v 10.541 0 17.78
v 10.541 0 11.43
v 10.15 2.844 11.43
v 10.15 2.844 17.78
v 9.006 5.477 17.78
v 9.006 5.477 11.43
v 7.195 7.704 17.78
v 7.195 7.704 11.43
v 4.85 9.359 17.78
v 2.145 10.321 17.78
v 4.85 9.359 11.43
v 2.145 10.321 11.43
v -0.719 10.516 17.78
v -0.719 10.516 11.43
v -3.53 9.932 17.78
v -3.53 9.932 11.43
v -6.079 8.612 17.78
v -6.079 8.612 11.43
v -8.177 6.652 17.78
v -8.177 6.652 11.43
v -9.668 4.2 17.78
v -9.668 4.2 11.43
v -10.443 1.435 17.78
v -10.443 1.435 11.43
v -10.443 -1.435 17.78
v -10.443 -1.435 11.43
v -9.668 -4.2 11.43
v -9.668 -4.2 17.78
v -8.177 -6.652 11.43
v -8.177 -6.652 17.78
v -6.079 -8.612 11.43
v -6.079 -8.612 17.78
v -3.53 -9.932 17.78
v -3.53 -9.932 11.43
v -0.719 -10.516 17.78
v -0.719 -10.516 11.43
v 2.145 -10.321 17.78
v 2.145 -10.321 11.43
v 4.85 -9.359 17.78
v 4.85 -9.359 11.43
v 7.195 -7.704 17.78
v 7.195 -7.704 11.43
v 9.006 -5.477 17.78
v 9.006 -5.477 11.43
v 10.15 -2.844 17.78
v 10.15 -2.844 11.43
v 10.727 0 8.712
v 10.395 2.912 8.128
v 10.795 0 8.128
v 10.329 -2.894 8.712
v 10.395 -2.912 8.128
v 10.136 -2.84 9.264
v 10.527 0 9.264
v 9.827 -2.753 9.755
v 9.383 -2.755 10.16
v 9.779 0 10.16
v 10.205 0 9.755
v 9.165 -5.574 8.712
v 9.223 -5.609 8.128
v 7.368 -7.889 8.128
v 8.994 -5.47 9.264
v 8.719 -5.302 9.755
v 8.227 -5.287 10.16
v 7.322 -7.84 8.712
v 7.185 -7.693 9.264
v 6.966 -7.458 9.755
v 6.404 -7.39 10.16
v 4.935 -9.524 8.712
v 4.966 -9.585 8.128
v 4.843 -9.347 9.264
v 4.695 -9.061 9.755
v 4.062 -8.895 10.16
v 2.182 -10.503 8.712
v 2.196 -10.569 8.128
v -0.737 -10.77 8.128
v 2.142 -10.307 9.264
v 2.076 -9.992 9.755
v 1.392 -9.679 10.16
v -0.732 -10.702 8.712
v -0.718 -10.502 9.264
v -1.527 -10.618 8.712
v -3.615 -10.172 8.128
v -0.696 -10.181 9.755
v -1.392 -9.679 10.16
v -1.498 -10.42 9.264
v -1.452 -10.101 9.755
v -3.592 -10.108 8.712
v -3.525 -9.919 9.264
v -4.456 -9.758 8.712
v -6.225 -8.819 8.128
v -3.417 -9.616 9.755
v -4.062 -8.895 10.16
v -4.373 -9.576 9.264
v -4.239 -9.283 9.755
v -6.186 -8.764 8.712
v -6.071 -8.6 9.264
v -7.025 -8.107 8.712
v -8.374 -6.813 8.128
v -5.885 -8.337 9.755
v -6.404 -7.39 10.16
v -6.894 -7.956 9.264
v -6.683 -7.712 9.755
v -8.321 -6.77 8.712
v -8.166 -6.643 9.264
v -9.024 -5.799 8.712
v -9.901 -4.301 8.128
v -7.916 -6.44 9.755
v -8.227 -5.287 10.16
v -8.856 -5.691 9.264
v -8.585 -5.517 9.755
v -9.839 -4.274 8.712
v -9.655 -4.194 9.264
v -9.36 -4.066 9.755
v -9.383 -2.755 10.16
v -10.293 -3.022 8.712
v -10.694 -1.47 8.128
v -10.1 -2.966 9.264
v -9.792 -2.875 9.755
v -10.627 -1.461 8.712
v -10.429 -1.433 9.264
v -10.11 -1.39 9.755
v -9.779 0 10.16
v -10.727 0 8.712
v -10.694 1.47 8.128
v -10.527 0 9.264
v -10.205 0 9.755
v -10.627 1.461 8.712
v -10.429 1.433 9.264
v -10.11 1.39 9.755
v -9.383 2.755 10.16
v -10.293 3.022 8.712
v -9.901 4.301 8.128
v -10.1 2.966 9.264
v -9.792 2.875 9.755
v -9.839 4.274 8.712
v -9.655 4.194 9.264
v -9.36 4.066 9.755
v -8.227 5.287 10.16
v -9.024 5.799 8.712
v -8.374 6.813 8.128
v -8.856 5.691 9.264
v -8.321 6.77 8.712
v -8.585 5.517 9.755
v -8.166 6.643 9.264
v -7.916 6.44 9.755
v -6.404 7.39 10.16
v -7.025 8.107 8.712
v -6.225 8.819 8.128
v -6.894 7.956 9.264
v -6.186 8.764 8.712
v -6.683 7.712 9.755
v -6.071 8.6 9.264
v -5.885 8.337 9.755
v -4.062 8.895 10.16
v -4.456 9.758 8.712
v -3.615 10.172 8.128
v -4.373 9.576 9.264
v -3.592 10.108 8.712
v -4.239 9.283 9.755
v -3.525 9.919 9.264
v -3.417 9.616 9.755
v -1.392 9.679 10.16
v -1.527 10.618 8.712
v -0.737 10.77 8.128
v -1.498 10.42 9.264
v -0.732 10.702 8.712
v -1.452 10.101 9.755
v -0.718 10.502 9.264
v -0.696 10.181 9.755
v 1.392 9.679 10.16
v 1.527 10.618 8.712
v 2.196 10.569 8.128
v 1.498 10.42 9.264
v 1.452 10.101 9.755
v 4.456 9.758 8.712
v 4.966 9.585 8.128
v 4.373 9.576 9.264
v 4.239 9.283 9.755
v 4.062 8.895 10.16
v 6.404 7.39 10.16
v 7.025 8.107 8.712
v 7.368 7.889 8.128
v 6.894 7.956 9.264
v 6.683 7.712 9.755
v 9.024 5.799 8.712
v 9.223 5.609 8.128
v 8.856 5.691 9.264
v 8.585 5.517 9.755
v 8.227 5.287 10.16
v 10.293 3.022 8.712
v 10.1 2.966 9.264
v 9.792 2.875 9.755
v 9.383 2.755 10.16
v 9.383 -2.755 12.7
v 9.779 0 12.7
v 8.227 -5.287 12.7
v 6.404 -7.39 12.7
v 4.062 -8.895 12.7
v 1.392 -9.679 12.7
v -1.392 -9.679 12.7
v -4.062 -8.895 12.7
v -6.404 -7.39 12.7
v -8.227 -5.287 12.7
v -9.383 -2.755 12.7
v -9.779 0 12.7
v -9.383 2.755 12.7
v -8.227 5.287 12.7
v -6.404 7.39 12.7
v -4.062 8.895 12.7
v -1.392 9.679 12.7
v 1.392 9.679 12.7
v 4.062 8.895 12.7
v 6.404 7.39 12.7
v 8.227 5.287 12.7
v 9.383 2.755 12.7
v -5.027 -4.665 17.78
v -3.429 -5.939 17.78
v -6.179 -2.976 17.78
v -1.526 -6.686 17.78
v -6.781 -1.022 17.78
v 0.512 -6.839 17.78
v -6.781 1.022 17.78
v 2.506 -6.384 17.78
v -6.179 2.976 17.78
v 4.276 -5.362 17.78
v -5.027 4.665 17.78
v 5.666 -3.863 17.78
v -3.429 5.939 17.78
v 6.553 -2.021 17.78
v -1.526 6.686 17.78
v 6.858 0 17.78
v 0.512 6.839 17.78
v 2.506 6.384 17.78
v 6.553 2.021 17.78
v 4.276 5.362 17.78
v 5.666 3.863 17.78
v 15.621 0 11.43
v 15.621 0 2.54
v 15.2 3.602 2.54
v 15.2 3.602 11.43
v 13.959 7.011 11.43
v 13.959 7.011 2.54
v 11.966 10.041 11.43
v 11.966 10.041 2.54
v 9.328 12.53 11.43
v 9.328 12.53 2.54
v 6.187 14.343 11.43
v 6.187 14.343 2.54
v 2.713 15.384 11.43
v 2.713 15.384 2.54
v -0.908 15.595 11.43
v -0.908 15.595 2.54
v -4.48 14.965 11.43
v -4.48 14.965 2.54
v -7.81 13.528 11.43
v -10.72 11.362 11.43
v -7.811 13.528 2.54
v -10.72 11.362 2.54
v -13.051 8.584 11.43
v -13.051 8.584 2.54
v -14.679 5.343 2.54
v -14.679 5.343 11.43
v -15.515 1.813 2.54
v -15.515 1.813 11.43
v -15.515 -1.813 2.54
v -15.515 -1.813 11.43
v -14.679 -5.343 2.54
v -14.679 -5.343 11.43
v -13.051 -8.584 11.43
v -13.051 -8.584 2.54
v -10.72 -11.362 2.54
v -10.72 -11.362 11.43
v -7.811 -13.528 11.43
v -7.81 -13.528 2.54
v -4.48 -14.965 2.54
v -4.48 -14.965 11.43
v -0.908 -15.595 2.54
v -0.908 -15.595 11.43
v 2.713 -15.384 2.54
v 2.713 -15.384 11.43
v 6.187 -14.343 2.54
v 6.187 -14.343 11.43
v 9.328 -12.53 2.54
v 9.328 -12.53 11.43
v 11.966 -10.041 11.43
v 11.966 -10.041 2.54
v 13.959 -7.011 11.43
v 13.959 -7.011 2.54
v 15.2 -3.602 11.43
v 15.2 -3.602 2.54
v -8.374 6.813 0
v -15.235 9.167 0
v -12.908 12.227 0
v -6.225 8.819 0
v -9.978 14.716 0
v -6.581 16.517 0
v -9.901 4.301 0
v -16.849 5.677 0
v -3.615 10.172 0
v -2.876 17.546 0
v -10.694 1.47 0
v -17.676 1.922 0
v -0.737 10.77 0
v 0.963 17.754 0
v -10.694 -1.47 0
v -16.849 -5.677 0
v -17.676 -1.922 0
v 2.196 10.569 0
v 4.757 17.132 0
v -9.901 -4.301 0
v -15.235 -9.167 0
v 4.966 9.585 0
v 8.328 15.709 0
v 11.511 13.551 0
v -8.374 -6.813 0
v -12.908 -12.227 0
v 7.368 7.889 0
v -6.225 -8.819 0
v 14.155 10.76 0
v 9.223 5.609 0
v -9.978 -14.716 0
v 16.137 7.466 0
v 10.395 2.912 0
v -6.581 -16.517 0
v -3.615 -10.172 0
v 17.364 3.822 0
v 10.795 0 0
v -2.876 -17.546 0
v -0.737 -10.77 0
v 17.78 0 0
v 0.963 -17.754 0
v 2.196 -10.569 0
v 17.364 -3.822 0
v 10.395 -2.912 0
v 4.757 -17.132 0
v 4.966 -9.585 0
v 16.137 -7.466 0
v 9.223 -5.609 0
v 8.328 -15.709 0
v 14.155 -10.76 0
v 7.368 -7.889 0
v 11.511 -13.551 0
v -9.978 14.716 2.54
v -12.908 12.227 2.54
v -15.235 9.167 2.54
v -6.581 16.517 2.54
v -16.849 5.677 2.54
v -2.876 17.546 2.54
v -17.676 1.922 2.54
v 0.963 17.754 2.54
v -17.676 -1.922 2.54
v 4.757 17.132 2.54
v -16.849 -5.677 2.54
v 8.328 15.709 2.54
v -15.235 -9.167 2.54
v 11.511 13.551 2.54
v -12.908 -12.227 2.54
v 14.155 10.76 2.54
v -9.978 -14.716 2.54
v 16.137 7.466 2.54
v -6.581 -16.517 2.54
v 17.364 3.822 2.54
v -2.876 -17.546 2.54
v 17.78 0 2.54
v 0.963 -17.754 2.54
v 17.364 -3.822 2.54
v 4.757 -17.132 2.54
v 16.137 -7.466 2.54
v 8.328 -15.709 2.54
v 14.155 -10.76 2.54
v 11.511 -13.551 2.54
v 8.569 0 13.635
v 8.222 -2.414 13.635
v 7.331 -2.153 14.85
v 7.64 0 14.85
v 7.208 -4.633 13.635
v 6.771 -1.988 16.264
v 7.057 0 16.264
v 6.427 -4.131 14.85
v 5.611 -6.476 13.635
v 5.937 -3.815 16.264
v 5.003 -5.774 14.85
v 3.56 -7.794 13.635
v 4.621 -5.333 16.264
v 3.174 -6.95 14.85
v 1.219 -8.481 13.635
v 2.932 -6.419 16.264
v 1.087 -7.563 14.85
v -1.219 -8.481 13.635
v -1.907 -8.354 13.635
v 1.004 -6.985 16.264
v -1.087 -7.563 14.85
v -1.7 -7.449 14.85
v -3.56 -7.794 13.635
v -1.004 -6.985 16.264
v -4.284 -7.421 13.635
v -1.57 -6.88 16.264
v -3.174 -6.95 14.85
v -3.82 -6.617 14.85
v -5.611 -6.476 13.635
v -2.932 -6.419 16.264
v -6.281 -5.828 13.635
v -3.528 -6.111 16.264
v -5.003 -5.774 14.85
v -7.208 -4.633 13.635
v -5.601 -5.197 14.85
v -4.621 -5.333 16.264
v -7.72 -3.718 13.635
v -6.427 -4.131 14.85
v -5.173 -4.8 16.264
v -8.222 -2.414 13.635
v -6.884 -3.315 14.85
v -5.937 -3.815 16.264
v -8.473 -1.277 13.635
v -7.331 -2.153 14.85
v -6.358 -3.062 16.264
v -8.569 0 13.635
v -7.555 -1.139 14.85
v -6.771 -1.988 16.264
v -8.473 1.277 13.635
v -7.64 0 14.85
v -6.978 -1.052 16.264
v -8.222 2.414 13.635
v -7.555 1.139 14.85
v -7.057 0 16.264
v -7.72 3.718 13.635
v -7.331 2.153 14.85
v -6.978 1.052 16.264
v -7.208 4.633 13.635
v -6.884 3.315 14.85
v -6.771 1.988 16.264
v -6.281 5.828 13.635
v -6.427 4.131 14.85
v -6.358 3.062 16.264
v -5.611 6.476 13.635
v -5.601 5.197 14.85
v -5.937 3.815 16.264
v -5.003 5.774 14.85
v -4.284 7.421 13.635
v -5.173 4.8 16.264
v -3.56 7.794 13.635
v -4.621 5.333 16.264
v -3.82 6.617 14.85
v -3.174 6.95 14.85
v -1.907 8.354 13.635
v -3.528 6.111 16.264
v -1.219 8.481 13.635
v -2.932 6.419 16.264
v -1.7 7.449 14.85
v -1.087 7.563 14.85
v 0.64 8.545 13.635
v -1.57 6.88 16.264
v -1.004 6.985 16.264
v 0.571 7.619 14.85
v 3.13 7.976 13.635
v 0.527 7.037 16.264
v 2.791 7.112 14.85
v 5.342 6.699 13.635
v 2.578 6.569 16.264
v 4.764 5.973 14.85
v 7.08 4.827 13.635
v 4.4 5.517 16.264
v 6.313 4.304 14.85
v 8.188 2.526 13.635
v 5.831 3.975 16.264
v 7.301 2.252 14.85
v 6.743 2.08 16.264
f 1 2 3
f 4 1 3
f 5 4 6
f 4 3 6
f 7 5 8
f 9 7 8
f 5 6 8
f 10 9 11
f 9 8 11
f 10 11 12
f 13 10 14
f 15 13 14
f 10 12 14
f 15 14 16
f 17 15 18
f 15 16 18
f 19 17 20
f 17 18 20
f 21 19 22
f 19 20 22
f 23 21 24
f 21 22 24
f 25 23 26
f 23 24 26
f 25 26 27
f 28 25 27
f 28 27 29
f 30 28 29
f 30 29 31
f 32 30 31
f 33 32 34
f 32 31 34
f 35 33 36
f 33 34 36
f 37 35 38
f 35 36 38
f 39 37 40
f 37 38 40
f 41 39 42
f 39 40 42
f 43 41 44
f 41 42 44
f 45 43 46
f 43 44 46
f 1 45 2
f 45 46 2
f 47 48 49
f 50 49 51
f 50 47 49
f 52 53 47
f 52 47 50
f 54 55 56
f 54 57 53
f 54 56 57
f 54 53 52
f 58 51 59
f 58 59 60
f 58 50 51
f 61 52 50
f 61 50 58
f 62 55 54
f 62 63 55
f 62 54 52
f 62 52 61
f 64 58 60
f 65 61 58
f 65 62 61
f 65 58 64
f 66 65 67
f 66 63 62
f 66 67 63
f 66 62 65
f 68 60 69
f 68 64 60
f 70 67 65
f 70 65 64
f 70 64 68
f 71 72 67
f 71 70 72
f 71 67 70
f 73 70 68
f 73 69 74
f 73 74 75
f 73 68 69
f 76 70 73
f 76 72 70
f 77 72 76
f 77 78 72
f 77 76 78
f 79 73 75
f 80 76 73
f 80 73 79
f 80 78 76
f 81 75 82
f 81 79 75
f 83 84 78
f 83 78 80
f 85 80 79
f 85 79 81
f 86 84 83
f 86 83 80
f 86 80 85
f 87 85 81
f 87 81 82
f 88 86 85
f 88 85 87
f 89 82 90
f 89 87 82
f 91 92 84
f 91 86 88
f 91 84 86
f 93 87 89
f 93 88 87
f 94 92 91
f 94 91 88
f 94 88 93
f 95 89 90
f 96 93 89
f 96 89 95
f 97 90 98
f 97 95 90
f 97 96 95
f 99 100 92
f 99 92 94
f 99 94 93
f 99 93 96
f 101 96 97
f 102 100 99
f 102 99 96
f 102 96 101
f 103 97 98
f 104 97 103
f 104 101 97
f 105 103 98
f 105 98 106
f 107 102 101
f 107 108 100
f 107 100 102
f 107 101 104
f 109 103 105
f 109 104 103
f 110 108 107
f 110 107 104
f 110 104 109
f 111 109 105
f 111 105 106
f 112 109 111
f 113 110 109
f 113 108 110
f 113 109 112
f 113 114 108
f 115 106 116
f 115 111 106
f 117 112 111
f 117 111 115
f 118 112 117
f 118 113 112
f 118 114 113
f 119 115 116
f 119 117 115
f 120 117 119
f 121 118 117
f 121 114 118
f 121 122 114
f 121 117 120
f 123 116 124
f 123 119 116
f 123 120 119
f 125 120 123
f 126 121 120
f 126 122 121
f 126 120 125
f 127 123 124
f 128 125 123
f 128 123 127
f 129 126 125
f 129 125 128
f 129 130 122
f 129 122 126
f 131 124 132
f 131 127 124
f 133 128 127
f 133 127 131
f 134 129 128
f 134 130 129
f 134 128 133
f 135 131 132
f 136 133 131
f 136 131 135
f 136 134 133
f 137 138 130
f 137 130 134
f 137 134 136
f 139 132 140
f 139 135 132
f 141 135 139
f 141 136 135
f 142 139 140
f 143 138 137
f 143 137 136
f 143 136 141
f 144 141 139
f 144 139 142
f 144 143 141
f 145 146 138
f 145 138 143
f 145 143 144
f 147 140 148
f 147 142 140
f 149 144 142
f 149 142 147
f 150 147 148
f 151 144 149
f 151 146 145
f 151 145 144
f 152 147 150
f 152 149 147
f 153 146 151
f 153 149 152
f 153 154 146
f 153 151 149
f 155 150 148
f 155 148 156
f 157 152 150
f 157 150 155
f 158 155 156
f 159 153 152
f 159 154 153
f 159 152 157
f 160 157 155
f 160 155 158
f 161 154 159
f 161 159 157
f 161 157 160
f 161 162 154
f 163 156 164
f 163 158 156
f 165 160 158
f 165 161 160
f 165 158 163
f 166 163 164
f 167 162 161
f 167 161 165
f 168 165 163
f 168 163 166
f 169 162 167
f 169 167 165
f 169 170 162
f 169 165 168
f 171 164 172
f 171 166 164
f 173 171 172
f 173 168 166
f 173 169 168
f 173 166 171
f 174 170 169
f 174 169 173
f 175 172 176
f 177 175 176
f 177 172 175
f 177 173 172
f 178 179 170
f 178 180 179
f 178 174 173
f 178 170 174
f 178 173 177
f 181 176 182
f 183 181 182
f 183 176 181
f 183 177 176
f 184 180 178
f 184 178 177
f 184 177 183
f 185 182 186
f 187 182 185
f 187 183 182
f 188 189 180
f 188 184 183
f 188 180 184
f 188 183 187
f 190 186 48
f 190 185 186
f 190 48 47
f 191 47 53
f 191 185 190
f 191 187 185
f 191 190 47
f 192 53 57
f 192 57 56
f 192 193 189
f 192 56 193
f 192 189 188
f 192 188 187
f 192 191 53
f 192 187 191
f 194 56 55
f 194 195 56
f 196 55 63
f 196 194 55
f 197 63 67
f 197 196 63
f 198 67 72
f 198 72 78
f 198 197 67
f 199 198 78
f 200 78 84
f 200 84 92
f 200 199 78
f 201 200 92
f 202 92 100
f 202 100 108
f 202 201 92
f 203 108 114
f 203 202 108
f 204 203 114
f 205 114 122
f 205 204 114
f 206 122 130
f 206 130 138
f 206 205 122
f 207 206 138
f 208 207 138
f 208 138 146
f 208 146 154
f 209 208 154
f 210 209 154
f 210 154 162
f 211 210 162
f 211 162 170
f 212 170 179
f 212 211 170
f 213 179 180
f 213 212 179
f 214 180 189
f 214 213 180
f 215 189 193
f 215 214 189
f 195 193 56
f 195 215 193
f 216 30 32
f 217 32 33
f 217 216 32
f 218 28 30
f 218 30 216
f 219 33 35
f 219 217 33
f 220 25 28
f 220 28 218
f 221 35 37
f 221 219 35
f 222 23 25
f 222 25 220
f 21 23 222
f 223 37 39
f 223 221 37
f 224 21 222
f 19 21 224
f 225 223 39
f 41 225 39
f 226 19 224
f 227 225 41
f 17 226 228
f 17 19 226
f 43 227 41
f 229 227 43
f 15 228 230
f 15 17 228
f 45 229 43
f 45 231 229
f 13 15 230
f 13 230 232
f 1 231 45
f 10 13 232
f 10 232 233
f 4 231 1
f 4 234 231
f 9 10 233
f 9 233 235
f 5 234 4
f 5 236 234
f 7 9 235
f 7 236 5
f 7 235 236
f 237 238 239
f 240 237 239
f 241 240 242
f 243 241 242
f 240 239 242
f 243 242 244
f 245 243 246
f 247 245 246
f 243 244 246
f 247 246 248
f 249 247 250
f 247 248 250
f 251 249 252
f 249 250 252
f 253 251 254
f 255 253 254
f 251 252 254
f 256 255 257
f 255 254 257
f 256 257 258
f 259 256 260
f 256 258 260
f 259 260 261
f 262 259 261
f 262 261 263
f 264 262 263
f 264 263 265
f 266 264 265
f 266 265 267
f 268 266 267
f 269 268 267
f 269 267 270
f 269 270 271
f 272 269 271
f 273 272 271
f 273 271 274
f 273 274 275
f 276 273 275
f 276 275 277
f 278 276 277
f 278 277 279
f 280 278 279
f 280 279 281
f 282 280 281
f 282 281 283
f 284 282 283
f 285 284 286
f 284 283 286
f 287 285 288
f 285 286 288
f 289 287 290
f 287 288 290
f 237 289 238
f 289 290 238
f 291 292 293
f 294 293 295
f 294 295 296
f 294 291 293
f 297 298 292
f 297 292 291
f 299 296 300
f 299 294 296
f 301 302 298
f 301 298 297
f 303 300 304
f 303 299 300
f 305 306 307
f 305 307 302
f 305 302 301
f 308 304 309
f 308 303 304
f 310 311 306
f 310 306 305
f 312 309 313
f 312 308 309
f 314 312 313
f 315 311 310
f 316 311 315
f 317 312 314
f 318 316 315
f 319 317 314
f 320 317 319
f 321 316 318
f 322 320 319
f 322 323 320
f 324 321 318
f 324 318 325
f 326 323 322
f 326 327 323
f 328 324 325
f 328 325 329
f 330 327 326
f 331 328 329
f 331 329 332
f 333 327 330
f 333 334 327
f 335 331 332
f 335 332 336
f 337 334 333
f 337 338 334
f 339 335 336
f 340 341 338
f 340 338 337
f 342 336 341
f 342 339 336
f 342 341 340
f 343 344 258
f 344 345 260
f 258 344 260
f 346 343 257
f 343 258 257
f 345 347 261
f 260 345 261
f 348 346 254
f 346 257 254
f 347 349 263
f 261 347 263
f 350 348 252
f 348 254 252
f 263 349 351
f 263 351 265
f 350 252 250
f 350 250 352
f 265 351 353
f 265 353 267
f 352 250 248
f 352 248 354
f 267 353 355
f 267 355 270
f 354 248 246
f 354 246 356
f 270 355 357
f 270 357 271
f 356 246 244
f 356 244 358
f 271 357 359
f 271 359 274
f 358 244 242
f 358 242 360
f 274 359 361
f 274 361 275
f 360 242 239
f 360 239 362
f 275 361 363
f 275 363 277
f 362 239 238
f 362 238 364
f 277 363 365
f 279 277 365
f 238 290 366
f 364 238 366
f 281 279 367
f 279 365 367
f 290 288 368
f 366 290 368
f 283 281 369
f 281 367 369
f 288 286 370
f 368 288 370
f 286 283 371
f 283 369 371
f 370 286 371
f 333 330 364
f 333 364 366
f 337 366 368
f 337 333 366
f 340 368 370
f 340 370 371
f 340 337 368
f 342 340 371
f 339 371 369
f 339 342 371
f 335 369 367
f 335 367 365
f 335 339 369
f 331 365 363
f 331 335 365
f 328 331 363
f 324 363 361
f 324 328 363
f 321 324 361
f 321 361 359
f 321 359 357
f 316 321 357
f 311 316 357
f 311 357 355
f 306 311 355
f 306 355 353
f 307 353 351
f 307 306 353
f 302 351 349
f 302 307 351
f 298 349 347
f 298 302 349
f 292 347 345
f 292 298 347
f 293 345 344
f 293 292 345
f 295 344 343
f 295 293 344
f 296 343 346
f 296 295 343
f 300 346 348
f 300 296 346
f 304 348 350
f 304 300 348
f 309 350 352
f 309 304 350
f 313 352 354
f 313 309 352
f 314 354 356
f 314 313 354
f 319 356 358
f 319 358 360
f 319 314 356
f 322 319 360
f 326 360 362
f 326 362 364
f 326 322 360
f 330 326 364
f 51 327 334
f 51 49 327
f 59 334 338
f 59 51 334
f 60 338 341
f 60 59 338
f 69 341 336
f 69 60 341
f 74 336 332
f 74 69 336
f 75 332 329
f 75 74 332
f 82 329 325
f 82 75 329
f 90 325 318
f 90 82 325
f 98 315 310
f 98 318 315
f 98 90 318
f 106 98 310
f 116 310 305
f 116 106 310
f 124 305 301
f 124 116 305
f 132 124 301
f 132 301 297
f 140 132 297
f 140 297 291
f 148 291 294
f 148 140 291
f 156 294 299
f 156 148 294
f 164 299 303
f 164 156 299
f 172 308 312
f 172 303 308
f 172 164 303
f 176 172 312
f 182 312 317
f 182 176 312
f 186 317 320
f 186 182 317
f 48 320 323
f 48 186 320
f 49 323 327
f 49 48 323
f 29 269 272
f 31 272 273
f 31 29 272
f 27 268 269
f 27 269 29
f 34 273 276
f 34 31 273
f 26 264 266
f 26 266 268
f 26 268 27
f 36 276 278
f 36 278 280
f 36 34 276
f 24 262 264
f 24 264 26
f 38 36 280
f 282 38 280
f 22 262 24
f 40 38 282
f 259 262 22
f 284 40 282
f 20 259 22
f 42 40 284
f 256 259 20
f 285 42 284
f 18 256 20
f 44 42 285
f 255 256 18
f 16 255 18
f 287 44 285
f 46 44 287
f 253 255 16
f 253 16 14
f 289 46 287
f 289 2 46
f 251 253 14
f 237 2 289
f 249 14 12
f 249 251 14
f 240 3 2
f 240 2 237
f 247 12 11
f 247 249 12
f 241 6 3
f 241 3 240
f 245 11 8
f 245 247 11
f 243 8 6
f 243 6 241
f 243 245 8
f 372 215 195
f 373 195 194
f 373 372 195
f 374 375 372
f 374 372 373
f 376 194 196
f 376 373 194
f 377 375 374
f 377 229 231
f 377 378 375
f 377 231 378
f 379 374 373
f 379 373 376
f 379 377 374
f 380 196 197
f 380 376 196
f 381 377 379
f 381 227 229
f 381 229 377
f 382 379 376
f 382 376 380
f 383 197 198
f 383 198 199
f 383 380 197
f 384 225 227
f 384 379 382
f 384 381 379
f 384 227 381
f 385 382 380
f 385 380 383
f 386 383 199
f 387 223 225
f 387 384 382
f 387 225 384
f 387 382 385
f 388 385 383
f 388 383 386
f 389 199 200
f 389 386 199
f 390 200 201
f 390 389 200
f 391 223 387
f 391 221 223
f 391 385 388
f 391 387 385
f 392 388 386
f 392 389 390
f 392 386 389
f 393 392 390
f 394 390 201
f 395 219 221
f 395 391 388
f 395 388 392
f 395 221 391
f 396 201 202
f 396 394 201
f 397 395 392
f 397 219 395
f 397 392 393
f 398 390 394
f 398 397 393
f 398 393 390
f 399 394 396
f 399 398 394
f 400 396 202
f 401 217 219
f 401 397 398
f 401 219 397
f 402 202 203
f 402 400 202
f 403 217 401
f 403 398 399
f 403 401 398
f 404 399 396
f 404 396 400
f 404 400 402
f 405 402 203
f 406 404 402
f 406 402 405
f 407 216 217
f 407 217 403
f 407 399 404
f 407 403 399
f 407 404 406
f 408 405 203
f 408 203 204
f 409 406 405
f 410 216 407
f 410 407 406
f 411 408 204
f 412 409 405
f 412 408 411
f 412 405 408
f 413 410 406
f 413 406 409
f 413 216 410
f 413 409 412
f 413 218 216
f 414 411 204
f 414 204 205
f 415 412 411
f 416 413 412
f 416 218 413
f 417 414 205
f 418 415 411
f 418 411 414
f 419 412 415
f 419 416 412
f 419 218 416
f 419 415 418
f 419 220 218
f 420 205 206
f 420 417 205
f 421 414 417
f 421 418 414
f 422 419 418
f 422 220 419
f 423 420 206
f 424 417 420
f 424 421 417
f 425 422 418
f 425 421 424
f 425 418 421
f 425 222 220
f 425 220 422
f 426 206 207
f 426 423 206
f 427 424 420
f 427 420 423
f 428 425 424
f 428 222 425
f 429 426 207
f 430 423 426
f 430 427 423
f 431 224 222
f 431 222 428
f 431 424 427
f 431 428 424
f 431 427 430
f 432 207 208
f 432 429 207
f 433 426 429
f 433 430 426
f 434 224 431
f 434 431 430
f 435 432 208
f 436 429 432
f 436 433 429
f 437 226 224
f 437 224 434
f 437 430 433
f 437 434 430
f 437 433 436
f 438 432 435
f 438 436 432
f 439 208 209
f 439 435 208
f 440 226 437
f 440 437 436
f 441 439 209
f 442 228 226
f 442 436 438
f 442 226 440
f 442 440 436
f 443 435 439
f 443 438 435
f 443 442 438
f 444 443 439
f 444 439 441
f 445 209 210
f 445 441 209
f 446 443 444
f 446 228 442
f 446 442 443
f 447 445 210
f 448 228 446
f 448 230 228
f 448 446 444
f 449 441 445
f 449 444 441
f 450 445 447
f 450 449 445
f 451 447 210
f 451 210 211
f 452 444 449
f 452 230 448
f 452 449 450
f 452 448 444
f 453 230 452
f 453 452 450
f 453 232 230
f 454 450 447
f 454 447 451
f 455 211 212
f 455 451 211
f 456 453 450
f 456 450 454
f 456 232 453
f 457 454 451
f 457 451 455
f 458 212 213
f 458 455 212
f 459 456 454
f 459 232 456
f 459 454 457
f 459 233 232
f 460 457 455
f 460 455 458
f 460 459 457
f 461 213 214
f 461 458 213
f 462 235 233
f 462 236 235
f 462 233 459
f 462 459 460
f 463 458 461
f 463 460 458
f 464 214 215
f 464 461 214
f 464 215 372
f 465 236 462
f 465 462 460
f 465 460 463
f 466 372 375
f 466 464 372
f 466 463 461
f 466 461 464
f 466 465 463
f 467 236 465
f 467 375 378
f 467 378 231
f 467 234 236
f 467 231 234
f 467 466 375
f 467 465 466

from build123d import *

# Parameters (mm, degrees)
F0_R     = 15.621
F1_DEPTH = 11.43
F2_R     = 10.541
F3_DEPTH = 6.35
F4_R     = 17.78
F5_DEPTH = 2.54
F6_R     = 6.6675
F7_DEPTH = 17.781


with BuildPart() as f1:
    # F0 (on Top) → F1 (new body)
    with BuildSketch(Plane.XY):
        Circle(F0_R)
    extrude(amount=F1_DEPTH)

    # F2 (on face) → F3 (join)
    with BuildSketch(Plane.XY.offset(11.43)):
        Circle(F2_R)
    extrude(amount=F3_DEPTH)

    # F4 (on face) → F5 (join)
    with BuildSketch(Plane(origin=(0, 0, 0), x_dir=(1, 0, 0), z_dir=(0, 0, -1))):
        Circle(F4_R)
    extrude(amount=-F5_DEPTH)

    # F6 (on face) → F7 (cut, through all)
    with BuildSketch(Plane.XY.offset(17.78)):
        Circle(F6_R)
    extrude(amount=-F7_DEPTH, mode=Mode.SUBTRACT)

    # F8 (on Front) → F9 (revolve, cut)
    with BuildSketch(Plane.XZ):
        with BuildLine():
            ThreePointArc((9.779, 12.7), (7.64031, 14.850041), (6.858, 17.78))
            Line((6.858, 17.78), (1.041292, 17.78))
            Line((1.041292, 17.78), (1.041292, -3.794143))
            Line((1.041292, -3.794143), (10.795, -3.794143))
            Line((10.795, -3.794143), (10.795, 8.128))
            ThreePointArc((10.795, 8.128), (10.526845, 9.263923), (9.779, 10.16))
            Line((9.779, 10.16), (9.779, 12.7))
        make_face()
    revolve(axis=Axis((0, 0, 0.73688), (0, 0, -1)), mode=Mode.SUBTRACT)


solid = f1.part
